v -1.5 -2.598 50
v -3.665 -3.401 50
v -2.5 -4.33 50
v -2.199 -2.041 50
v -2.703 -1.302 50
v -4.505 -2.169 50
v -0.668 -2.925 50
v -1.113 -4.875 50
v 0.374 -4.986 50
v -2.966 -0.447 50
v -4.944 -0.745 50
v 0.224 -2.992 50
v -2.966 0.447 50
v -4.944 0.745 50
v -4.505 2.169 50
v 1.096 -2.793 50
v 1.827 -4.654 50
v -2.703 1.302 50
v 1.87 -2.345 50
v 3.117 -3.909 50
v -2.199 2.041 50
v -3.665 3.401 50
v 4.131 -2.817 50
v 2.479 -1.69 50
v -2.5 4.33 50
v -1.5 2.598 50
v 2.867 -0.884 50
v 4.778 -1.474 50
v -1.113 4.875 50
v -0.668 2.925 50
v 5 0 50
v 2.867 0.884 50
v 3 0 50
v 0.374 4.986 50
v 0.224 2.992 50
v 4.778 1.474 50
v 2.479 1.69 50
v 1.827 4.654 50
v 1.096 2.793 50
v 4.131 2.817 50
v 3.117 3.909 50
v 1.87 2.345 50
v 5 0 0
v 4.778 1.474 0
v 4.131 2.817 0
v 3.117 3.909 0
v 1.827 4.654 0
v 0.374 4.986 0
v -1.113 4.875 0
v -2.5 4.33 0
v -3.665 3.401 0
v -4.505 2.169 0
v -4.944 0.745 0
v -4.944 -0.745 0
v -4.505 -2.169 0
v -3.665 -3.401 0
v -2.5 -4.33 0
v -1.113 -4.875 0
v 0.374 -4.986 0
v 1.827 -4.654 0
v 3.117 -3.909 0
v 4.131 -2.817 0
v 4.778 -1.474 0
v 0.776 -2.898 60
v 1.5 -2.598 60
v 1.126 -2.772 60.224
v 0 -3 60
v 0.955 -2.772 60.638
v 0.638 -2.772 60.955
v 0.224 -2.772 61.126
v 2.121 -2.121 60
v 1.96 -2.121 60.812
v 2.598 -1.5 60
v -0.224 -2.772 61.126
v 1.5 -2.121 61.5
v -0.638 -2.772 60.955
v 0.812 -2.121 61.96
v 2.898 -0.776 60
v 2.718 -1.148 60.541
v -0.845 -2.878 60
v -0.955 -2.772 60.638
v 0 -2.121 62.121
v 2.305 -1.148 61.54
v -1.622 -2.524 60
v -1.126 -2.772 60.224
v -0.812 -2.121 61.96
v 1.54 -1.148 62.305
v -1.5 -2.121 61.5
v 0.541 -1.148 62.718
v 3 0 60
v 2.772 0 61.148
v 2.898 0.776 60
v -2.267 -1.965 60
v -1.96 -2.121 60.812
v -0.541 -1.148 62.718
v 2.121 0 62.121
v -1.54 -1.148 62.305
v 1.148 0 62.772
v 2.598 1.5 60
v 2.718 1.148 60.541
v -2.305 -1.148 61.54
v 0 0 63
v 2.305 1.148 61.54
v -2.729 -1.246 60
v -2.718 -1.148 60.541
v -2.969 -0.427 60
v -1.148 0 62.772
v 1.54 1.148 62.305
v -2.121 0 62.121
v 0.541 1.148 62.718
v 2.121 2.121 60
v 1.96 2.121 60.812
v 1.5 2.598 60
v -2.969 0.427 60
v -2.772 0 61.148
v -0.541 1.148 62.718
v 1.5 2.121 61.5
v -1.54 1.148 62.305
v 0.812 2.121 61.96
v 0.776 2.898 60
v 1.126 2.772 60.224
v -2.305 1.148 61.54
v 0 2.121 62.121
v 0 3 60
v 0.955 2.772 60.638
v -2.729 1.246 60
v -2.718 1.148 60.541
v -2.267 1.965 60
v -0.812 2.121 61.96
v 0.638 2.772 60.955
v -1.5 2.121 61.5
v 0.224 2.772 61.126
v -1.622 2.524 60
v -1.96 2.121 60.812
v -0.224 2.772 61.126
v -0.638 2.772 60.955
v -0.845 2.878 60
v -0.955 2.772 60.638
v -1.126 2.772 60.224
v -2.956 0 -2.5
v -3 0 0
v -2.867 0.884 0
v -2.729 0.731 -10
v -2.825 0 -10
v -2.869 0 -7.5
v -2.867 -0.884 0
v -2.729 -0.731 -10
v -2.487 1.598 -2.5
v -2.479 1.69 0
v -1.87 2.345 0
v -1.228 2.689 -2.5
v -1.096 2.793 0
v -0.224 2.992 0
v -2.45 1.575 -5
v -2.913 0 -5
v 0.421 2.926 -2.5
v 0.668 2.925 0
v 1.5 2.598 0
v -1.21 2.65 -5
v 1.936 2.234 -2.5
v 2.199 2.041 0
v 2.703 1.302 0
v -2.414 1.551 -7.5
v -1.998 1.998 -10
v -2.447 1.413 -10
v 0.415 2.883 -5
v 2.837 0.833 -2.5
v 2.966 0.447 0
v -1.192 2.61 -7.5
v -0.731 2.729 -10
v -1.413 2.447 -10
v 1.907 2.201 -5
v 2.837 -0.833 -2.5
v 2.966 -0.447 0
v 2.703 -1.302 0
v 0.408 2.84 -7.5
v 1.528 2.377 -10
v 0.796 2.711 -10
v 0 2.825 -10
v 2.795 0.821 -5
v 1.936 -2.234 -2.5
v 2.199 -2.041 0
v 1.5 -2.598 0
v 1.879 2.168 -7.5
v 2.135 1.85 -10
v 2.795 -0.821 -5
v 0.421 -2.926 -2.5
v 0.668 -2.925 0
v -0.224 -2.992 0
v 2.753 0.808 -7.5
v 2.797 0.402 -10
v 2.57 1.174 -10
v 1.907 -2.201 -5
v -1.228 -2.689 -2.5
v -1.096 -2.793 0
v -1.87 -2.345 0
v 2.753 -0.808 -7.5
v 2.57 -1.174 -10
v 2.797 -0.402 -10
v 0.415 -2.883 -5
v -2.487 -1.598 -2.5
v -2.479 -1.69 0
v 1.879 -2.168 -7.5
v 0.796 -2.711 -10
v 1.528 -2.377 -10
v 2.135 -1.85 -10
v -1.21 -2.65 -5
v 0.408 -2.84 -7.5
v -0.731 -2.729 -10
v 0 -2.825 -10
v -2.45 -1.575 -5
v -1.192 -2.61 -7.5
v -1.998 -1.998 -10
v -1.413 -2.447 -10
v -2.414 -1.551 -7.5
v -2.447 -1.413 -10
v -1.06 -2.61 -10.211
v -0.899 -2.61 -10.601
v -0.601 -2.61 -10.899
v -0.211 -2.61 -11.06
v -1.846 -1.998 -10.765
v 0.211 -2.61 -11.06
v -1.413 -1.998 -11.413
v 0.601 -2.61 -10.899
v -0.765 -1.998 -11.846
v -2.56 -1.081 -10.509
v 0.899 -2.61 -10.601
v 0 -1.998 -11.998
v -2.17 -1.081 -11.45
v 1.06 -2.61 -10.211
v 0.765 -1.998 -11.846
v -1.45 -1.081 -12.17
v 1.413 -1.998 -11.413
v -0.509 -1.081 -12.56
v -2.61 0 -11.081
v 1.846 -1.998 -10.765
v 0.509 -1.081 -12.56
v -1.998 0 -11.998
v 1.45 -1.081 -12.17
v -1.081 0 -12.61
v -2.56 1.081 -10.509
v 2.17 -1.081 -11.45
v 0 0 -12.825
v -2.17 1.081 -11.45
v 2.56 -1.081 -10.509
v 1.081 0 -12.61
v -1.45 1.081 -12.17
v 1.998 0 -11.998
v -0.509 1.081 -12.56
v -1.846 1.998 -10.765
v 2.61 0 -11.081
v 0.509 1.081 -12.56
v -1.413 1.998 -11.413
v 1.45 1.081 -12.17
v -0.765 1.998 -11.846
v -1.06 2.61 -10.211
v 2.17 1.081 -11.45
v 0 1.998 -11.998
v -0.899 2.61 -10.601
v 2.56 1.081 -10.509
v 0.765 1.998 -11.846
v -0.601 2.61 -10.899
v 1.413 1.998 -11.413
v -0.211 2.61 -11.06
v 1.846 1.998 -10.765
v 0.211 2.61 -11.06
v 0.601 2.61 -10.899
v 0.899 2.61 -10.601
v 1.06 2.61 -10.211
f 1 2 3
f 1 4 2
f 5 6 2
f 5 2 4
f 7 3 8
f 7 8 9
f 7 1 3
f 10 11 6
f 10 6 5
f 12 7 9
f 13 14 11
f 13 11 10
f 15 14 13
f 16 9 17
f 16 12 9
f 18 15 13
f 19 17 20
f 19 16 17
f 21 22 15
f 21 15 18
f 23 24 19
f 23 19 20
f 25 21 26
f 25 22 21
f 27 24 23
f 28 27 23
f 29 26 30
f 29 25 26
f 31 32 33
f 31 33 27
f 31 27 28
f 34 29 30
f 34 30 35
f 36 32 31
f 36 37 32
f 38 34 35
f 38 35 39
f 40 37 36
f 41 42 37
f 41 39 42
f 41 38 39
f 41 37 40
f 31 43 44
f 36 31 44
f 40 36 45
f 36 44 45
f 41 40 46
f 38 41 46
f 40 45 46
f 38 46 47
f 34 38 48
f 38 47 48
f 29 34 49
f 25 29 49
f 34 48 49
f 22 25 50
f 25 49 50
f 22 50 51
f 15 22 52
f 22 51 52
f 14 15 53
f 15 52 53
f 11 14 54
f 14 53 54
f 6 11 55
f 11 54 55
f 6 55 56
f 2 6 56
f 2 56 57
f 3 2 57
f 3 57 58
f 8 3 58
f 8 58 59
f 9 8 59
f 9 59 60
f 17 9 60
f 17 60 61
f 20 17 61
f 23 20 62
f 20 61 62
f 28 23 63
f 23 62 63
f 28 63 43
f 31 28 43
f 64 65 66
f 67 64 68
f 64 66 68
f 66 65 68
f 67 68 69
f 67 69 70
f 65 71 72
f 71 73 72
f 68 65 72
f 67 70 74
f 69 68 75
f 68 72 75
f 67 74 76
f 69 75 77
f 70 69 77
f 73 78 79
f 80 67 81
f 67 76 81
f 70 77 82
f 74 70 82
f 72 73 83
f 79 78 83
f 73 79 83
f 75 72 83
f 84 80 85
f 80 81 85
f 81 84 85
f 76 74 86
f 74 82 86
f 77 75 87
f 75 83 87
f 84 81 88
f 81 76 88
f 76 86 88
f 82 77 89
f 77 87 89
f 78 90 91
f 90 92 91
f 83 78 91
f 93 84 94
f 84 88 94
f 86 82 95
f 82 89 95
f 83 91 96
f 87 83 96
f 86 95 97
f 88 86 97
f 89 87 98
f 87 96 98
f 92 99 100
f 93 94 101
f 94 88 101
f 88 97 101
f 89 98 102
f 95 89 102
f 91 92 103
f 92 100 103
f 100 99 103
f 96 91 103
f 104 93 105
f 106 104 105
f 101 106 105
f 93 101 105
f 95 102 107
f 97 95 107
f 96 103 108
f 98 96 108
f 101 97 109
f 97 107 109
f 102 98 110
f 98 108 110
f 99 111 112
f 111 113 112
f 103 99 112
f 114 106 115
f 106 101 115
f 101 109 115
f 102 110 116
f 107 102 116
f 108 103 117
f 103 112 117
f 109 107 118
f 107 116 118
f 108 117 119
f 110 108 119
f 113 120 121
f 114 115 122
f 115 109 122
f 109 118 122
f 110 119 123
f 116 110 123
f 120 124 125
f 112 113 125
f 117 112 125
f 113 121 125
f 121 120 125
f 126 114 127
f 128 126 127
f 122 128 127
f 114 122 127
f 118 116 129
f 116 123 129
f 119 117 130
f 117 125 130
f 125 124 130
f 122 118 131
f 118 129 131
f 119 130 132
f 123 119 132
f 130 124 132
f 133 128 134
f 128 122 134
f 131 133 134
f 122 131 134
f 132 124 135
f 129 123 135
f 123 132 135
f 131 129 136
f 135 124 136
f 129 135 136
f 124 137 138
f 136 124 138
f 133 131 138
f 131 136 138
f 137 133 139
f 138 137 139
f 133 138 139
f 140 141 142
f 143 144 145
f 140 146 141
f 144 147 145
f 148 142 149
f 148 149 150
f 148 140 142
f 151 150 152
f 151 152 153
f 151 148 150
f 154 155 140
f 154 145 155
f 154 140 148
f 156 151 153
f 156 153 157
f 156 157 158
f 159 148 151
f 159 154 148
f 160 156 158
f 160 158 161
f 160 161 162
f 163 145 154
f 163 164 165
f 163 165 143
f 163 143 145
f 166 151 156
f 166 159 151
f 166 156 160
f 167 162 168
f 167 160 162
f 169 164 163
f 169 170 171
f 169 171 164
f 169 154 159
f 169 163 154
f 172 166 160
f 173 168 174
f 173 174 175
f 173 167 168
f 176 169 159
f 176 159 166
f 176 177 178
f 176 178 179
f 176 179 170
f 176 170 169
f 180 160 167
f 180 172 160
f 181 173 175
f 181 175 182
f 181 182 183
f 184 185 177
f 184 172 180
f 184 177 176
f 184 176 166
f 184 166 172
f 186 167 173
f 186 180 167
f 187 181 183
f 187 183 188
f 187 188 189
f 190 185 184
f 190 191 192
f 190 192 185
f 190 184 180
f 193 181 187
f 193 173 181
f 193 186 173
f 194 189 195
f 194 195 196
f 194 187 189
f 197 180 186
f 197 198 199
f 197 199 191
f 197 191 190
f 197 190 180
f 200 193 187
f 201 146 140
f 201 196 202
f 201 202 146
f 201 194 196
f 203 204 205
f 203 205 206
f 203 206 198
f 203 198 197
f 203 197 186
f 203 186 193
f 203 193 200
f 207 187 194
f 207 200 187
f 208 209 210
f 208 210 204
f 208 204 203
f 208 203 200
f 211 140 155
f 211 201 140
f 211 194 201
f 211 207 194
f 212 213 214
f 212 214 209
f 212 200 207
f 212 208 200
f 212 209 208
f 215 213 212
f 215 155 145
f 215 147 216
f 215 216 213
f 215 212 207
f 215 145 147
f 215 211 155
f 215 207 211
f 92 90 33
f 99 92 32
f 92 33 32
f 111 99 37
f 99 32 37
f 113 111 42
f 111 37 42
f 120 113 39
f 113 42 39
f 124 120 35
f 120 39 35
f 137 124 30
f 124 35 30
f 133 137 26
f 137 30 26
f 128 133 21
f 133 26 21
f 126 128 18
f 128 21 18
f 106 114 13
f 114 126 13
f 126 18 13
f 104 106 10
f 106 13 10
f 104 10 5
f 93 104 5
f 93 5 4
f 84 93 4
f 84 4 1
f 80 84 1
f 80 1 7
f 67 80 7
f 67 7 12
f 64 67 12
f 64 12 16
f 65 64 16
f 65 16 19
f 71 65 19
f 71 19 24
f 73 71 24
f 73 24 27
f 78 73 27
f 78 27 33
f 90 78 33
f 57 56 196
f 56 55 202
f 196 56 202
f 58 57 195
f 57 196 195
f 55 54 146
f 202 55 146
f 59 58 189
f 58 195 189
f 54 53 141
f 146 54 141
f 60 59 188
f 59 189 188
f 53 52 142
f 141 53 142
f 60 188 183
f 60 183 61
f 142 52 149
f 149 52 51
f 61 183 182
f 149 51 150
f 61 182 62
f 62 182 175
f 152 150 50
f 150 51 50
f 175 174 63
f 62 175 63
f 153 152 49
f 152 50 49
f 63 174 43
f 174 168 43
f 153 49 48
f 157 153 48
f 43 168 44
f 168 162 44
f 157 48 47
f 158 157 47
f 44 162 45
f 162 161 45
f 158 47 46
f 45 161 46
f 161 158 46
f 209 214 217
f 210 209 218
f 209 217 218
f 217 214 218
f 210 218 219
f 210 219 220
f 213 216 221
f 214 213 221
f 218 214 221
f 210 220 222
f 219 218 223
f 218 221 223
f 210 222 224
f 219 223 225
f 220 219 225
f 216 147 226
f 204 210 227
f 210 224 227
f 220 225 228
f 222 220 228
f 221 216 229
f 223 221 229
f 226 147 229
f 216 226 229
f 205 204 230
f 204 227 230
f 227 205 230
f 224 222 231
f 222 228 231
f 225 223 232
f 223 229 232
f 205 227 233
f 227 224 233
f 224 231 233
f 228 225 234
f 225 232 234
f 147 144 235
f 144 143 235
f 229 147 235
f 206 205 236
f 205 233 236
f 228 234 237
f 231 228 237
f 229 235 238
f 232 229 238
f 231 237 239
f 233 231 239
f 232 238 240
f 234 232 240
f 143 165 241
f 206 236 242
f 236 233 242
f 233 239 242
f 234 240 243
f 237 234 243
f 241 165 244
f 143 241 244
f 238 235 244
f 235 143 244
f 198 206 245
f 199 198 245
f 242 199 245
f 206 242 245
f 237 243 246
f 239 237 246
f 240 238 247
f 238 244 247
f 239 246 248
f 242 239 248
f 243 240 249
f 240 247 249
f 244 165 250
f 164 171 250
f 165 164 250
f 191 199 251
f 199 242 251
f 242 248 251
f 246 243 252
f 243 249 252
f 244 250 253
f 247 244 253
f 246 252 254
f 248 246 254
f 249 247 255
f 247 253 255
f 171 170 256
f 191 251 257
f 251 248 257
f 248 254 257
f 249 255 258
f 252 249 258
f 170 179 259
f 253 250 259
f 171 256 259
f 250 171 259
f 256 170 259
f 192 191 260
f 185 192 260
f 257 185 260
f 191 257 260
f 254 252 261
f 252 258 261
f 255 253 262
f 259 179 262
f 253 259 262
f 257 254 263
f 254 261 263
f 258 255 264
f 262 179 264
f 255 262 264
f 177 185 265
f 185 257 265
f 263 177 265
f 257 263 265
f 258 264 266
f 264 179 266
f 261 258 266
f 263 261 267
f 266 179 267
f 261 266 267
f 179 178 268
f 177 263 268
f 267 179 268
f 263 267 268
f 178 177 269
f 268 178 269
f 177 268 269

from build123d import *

# Parameters (mm, degrees)
SKETCH2_R           = 5
BOSS_EXTRUDE1_DEPTH = 50
SKETCH3_R           = 3
BOSS_EXTRUDE2_DEPTH = 10
BOSS_EXTRUDE2_TAPER = 1
SKETCH5_R           = 3
BOSS_EXTRUDE3_DEPTH = 10


with BuildPart() as part:
    # Sketch2 → Boss-Extrude1 (new body)
    with BuildSketch(Plane.XY):
        Circle(SKETCH2_R)
    extrude(amount=BOSS_EXTRUDE1_DEPTH)

    # Sketch3 → Boss-Extrude2 (add)
    with BuildSketch(Plane(origin=(0, 0, 0), x_dir=(-1, 0, 0), z_dir=(0, 0, -1))):
        Circle(SKETCH3_R)
    extrude(amount=BOSS_EXTRUDE2_DEPTH, taper=BOSS_EXTRUDE2_TAPER)

    # Sketch4 → Revolve1 (revolve)
    with BuildSketch(Plane(origin=(0, 0, -10), x_dir=(-1, 0, 0), z_dir=(0, 0, -1))):
        with BuildLine():
            Line((0, 2.825449351), (0, -2.825449351))
            ThreePointArc((0, -2.825449351), (-2.825449351, 0), (0, 2.825449351))
        make_face()
    revolve(axis=Axis((0, 2.825449351, -10), (0, -1, 0)))

    # Sketch5 → Boss-Extrude3 (add)
    with BuildSketch(Plane.XY.offset(50)):
        Circle(SKETCH5_R)
    extrude(amount=BOSS_EXTRUDE3_DEPTH)

    # Sketch6 → Revolve2 (revolve)
    with BuildSketch(Plane.XY.offset(60)):
        with BuildLine():
            Line((0, 3), (0, -3))
            ThreePointArc((0, -3), (-3, 0), (0, 3))
        make_face()
    revolve(axis=Axis((0, 3, 60), (0, -1, 0)))


solid = part.part
